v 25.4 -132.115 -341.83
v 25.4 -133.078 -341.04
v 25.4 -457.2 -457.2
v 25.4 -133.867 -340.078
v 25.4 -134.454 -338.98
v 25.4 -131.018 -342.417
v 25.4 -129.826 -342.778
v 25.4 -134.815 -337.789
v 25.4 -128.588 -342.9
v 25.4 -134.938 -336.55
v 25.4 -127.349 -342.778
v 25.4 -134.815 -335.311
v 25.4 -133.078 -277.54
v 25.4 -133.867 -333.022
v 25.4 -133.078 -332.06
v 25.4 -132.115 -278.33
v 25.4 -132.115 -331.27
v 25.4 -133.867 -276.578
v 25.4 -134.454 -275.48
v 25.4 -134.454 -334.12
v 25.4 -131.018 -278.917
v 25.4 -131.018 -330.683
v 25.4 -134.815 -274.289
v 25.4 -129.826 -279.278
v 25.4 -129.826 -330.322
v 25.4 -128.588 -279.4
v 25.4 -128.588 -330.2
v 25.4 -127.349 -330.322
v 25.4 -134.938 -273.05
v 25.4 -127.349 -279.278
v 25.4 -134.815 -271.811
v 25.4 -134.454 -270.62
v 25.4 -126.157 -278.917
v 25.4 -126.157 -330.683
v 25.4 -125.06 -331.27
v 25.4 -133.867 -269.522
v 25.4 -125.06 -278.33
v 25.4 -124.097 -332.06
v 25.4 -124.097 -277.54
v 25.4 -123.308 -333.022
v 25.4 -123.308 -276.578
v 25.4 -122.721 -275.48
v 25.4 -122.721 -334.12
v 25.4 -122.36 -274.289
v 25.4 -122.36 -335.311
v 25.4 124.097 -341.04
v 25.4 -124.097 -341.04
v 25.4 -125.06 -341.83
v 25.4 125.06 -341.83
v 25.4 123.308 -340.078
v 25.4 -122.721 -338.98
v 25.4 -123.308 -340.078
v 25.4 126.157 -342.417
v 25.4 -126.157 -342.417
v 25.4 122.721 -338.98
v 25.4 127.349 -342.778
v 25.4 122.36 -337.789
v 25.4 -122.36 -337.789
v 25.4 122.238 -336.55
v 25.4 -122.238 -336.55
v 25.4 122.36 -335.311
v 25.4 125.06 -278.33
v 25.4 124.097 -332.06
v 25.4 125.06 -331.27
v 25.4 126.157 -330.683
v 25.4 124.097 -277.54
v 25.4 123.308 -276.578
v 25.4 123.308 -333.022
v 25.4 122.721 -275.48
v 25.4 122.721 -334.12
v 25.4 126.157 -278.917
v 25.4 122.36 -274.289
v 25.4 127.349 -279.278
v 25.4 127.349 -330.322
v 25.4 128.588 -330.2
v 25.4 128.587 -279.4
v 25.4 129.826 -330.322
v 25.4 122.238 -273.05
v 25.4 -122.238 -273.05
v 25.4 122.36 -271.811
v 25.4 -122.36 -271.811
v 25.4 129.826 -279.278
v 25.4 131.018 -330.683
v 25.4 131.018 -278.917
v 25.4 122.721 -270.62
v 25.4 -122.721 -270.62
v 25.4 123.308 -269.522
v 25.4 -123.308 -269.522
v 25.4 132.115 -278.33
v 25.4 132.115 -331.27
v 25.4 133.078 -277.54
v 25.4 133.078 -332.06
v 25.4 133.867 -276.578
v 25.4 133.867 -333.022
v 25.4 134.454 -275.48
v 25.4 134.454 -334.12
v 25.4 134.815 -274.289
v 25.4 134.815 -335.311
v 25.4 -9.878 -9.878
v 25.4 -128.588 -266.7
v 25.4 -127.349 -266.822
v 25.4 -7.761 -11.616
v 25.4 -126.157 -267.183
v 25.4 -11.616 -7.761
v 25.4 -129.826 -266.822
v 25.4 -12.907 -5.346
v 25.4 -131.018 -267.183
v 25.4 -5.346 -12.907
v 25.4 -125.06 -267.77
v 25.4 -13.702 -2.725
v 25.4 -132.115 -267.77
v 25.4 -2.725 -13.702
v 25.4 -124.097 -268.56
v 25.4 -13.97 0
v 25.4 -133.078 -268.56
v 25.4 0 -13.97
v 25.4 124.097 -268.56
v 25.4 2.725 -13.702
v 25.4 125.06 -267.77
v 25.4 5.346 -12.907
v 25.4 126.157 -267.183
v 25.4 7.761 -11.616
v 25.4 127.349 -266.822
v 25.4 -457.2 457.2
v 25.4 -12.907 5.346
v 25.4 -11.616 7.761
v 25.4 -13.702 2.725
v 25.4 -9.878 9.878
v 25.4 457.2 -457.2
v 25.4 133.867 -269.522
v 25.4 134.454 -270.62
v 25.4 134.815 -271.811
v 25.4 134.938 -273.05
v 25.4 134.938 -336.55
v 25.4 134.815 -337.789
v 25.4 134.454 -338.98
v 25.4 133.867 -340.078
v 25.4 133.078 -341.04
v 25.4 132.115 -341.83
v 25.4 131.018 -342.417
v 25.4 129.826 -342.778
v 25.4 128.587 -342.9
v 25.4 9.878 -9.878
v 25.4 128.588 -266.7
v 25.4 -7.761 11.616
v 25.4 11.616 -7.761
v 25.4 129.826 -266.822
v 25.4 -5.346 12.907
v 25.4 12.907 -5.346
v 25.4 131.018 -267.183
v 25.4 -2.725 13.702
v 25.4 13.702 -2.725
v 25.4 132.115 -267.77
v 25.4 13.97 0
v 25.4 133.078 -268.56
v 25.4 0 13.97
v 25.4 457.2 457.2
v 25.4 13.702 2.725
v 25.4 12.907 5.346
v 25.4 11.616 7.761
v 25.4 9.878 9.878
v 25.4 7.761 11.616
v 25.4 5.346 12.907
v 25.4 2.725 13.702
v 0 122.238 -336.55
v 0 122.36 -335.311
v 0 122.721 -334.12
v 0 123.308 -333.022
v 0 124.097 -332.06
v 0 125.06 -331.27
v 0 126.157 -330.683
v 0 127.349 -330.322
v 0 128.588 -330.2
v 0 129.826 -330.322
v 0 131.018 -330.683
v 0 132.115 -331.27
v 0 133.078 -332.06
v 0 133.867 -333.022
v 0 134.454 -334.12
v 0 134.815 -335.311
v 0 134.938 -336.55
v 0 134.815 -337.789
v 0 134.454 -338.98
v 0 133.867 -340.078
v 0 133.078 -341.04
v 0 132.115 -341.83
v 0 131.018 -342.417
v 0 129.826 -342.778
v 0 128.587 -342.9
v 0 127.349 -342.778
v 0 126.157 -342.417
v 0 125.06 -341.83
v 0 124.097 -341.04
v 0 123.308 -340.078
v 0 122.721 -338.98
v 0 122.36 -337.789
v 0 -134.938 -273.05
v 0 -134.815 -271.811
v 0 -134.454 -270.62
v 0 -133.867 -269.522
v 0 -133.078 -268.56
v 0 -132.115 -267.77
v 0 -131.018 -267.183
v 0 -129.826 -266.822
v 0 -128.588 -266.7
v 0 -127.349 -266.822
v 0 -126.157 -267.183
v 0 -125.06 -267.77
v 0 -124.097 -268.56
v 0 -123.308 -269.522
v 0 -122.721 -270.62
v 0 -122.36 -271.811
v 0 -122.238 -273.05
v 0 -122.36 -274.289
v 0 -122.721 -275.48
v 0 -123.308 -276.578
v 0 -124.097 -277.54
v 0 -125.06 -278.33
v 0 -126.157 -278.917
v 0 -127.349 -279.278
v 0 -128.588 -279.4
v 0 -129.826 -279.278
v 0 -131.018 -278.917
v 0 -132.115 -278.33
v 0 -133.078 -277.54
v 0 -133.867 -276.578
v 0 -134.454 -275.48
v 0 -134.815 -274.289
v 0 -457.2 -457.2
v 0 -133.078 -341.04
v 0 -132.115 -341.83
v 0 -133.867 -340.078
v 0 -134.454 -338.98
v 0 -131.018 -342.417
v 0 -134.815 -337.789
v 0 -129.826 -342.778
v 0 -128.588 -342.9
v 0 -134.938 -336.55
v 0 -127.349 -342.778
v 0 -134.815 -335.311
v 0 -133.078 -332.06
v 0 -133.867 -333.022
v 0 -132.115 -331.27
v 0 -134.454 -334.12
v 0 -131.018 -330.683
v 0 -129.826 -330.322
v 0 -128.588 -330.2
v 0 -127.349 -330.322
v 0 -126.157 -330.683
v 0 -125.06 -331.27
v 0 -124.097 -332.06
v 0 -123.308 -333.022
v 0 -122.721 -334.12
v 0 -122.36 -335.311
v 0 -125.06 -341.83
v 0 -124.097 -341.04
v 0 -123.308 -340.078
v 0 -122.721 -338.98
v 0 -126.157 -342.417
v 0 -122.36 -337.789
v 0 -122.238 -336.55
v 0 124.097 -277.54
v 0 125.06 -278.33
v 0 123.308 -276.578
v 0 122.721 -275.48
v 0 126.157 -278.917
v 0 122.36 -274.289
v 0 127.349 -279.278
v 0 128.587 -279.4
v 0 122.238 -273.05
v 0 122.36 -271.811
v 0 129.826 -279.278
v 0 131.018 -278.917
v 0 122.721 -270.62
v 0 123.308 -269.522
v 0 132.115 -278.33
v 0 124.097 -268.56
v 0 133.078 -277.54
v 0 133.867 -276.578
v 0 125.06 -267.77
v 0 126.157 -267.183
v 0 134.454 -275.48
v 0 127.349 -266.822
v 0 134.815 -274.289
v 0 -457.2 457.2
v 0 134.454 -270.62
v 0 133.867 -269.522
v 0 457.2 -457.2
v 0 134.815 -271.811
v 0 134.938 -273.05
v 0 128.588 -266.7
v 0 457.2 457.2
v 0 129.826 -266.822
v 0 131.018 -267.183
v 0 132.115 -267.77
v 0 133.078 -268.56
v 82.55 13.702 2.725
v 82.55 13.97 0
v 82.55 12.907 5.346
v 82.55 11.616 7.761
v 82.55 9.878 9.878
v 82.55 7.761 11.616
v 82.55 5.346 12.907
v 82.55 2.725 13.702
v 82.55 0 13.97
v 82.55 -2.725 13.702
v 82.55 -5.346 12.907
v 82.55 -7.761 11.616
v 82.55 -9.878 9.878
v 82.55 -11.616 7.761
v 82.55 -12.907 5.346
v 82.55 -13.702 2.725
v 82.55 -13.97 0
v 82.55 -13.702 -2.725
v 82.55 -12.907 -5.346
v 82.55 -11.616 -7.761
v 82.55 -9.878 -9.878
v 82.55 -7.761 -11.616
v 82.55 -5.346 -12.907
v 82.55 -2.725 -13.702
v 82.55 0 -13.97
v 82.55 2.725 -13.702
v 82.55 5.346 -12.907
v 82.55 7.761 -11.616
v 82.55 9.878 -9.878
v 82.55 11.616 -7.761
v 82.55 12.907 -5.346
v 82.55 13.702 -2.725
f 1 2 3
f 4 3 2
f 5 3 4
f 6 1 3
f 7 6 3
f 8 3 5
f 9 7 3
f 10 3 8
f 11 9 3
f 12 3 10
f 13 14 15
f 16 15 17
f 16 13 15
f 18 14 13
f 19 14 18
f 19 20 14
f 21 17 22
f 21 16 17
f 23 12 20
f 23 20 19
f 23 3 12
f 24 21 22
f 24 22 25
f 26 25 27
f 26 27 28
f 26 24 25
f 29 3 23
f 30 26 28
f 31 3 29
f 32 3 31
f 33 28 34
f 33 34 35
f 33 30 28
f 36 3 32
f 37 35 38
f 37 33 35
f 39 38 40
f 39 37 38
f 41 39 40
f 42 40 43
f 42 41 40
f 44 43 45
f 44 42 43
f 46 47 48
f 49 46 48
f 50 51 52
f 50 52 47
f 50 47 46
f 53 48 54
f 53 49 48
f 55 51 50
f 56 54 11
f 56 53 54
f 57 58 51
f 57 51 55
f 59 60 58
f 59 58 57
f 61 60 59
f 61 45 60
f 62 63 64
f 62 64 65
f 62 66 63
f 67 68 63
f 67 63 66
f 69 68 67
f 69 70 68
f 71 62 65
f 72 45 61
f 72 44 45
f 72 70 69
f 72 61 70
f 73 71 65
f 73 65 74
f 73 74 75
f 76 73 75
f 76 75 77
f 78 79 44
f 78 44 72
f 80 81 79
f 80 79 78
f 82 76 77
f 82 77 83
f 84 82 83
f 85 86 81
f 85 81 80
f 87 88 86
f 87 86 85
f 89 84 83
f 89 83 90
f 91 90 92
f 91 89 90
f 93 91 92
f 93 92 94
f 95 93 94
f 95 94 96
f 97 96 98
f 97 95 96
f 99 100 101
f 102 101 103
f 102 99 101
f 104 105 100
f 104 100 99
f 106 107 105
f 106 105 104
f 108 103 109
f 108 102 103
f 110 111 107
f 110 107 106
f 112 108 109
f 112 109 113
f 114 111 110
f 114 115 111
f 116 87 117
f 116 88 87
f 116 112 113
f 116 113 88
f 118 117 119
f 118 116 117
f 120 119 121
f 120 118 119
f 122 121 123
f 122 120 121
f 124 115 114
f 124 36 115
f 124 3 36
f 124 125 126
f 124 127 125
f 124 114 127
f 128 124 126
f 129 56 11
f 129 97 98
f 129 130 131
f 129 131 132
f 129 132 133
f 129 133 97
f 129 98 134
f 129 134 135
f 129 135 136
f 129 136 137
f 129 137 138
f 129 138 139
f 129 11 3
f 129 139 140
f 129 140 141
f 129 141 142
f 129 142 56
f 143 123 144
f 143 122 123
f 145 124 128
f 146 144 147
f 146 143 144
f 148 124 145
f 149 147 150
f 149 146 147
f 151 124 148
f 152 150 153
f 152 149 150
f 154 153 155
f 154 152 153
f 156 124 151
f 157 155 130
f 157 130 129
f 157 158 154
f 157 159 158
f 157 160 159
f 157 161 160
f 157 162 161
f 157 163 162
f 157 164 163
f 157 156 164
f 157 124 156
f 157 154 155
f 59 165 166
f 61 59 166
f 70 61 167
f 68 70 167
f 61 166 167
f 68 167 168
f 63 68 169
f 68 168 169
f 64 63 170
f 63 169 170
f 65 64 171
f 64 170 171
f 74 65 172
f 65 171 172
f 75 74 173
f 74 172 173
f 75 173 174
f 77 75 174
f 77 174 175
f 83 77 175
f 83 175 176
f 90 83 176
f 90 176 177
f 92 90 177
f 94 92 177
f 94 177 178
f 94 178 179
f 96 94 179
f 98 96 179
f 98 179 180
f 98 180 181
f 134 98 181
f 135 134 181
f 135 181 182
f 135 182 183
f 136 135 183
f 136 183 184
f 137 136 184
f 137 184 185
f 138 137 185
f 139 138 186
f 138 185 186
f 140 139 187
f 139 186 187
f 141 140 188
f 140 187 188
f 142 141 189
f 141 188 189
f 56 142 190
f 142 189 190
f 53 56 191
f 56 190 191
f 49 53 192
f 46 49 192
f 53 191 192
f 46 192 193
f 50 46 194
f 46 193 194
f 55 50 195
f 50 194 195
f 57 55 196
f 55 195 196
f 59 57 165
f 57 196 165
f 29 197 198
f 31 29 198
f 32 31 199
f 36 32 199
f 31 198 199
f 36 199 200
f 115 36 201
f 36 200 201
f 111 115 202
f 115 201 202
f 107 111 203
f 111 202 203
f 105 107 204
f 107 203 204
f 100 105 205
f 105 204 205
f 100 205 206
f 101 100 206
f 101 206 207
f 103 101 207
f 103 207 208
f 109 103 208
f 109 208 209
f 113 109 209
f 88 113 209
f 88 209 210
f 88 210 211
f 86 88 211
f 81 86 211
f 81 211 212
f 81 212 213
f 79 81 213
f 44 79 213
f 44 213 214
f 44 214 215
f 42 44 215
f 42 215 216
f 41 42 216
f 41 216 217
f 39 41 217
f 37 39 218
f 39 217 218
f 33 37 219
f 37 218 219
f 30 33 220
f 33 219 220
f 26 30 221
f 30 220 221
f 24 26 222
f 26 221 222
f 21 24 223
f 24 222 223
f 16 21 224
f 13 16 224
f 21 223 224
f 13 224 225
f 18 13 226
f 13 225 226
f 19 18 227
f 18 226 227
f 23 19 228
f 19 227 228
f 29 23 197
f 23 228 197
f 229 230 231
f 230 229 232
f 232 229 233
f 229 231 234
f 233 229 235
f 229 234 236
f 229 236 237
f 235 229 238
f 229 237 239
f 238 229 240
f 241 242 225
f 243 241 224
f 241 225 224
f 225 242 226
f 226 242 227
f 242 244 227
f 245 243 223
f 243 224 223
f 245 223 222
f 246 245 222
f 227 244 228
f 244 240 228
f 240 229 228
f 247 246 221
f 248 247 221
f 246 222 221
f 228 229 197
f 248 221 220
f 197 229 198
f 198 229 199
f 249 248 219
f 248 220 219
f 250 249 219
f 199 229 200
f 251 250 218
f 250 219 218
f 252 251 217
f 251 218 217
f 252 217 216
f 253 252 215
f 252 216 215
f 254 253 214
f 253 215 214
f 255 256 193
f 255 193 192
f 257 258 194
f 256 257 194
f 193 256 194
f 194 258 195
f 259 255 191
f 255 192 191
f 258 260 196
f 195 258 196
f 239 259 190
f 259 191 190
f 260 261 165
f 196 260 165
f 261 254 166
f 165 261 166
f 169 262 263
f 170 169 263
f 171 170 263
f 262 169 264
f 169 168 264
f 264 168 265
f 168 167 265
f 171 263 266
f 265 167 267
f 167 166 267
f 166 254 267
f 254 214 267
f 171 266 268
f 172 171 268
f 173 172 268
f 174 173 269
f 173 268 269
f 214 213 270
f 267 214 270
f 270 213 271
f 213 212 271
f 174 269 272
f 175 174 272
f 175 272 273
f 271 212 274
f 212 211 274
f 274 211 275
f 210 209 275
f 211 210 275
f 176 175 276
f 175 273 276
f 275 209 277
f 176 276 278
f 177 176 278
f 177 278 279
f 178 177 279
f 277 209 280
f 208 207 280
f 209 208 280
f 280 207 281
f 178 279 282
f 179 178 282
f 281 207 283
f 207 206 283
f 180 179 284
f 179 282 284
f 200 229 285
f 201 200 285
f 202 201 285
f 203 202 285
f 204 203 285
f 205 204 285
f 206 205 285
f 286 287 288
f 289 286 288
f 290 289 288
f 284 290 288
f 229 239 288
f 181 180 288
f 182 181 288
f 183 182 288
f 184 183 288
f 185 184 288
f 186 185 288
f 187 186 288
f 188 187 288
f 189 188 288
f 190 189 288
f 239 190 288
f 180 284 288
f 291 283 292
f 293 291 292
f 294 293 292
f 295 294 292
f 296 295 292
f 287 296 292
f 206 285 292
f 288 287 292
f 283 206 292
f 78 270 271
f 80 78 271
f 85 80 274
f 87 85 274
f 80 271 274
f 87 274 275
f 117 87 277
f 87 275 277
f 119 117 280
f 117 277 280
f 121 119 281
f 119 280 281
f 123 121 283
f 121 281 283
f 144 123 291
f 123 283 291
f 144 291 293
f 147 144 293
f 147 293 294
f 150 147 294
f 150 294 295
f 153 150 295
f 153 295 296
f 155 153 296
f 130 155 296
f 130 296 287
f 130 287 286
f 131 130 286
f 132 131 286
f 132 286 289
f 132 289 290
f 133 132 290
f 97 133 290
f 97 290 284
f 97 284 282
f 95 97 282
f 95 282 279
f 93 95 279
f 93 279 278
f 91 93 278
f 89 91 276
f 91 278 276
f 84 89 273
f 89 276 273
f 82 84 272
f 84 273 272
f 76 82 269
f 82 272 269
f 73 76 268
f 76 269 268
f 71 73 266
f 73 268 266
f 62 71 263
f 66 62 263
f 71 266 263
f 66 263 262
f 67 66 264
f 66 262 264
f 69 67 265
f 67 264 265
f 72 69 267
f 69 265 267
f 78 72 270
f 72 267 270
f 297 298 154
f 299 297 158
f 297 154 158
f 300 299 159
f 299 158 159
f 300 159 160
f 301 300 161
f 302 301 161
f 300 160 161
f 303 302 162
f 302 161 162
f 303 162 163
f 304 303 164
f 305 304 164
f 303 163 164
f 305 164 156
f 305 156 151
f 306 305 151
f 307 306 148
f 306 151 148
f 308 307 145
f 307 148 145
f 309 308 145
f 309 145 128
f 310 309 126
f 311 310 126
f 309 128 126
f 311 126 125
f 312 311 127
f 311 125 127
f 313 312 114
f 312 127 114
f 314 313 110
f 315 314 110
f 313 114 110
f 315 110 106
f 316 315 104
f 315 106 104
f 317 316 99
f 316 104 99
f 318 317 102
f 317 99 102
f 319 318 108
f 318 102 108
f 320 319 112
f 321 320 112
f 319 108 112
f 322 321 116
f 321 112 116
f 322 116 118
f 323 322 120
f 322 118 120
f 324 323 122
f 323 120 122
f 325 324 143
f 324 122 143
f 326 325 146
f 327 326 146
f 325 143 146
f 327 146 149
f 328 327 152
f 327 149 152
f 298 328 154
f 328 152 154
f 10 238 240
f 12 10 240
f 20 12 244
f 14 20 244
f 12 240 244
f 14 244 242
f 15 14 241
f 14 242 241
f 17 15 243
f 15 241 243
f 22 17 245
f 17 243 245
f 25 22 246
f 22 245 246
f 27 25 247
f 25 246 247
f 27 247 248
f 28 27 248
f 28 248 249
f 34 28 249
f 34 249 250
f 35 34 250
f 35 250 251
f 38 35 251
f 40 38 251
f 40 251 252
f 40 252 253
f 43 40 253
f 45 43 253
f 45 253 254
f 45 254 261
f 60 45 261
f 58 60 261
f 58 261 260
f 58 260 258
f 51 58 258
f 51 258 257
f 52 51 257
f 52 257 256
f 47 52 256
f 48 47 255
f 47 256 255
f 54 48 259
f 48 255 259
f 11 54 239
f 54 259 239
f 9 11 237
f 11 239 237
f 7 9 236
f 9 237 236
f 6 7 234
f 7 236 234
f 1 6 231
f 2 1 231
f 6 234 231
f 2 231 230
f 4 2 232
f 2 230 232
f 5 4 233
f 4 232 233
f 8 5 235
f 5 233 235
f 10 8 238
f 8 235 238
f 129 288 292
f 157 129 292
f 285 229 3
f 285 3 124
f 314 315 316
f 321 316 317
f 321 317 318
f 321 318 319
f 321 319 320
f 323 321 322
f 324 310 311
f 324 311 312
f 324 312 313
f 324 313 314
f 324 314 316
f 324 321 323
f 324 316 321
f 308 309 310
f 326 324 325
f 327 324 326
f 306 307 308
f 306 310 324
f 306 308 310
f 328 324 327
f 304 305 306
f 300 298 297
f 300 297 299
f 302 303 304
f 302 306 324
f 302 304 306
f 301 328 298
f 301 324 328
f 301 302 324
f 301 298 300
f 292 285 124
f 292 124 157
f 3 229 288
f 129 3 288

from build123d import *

# Parameters (mm, degrees)
F0_W     = 914.4
F0_H     = 914.4
F1_DEPTH = 25.4
F2_R     = 13.97
F3_DEPTH = 57.15
F5_D     = 12.7


with BuildPart() as f1:
    # F0 (on Right) → F1 (new body)
    with BuildSketch(Plane.YZ):
        Rectangle(F0_W, F0_H)
    extrude(amount=F1_DEPTH)

    # F2 (on face) → F3 (join)
    with BuildSketch(Plane.YZ.offset(25.4)):
        Circle(F2_R)
    extrude(amount=F3_DEPTH)

    # F5 (through all)
    with Locations(Plane.YZ.offset(25.4)):
        with Locations((-128.5875, -273.05), (128.5875, -273.05), (128.5875, -336.55), (-128.5875, -336.55)):
            Hole(F5_D / 2)


solid = f1.part
